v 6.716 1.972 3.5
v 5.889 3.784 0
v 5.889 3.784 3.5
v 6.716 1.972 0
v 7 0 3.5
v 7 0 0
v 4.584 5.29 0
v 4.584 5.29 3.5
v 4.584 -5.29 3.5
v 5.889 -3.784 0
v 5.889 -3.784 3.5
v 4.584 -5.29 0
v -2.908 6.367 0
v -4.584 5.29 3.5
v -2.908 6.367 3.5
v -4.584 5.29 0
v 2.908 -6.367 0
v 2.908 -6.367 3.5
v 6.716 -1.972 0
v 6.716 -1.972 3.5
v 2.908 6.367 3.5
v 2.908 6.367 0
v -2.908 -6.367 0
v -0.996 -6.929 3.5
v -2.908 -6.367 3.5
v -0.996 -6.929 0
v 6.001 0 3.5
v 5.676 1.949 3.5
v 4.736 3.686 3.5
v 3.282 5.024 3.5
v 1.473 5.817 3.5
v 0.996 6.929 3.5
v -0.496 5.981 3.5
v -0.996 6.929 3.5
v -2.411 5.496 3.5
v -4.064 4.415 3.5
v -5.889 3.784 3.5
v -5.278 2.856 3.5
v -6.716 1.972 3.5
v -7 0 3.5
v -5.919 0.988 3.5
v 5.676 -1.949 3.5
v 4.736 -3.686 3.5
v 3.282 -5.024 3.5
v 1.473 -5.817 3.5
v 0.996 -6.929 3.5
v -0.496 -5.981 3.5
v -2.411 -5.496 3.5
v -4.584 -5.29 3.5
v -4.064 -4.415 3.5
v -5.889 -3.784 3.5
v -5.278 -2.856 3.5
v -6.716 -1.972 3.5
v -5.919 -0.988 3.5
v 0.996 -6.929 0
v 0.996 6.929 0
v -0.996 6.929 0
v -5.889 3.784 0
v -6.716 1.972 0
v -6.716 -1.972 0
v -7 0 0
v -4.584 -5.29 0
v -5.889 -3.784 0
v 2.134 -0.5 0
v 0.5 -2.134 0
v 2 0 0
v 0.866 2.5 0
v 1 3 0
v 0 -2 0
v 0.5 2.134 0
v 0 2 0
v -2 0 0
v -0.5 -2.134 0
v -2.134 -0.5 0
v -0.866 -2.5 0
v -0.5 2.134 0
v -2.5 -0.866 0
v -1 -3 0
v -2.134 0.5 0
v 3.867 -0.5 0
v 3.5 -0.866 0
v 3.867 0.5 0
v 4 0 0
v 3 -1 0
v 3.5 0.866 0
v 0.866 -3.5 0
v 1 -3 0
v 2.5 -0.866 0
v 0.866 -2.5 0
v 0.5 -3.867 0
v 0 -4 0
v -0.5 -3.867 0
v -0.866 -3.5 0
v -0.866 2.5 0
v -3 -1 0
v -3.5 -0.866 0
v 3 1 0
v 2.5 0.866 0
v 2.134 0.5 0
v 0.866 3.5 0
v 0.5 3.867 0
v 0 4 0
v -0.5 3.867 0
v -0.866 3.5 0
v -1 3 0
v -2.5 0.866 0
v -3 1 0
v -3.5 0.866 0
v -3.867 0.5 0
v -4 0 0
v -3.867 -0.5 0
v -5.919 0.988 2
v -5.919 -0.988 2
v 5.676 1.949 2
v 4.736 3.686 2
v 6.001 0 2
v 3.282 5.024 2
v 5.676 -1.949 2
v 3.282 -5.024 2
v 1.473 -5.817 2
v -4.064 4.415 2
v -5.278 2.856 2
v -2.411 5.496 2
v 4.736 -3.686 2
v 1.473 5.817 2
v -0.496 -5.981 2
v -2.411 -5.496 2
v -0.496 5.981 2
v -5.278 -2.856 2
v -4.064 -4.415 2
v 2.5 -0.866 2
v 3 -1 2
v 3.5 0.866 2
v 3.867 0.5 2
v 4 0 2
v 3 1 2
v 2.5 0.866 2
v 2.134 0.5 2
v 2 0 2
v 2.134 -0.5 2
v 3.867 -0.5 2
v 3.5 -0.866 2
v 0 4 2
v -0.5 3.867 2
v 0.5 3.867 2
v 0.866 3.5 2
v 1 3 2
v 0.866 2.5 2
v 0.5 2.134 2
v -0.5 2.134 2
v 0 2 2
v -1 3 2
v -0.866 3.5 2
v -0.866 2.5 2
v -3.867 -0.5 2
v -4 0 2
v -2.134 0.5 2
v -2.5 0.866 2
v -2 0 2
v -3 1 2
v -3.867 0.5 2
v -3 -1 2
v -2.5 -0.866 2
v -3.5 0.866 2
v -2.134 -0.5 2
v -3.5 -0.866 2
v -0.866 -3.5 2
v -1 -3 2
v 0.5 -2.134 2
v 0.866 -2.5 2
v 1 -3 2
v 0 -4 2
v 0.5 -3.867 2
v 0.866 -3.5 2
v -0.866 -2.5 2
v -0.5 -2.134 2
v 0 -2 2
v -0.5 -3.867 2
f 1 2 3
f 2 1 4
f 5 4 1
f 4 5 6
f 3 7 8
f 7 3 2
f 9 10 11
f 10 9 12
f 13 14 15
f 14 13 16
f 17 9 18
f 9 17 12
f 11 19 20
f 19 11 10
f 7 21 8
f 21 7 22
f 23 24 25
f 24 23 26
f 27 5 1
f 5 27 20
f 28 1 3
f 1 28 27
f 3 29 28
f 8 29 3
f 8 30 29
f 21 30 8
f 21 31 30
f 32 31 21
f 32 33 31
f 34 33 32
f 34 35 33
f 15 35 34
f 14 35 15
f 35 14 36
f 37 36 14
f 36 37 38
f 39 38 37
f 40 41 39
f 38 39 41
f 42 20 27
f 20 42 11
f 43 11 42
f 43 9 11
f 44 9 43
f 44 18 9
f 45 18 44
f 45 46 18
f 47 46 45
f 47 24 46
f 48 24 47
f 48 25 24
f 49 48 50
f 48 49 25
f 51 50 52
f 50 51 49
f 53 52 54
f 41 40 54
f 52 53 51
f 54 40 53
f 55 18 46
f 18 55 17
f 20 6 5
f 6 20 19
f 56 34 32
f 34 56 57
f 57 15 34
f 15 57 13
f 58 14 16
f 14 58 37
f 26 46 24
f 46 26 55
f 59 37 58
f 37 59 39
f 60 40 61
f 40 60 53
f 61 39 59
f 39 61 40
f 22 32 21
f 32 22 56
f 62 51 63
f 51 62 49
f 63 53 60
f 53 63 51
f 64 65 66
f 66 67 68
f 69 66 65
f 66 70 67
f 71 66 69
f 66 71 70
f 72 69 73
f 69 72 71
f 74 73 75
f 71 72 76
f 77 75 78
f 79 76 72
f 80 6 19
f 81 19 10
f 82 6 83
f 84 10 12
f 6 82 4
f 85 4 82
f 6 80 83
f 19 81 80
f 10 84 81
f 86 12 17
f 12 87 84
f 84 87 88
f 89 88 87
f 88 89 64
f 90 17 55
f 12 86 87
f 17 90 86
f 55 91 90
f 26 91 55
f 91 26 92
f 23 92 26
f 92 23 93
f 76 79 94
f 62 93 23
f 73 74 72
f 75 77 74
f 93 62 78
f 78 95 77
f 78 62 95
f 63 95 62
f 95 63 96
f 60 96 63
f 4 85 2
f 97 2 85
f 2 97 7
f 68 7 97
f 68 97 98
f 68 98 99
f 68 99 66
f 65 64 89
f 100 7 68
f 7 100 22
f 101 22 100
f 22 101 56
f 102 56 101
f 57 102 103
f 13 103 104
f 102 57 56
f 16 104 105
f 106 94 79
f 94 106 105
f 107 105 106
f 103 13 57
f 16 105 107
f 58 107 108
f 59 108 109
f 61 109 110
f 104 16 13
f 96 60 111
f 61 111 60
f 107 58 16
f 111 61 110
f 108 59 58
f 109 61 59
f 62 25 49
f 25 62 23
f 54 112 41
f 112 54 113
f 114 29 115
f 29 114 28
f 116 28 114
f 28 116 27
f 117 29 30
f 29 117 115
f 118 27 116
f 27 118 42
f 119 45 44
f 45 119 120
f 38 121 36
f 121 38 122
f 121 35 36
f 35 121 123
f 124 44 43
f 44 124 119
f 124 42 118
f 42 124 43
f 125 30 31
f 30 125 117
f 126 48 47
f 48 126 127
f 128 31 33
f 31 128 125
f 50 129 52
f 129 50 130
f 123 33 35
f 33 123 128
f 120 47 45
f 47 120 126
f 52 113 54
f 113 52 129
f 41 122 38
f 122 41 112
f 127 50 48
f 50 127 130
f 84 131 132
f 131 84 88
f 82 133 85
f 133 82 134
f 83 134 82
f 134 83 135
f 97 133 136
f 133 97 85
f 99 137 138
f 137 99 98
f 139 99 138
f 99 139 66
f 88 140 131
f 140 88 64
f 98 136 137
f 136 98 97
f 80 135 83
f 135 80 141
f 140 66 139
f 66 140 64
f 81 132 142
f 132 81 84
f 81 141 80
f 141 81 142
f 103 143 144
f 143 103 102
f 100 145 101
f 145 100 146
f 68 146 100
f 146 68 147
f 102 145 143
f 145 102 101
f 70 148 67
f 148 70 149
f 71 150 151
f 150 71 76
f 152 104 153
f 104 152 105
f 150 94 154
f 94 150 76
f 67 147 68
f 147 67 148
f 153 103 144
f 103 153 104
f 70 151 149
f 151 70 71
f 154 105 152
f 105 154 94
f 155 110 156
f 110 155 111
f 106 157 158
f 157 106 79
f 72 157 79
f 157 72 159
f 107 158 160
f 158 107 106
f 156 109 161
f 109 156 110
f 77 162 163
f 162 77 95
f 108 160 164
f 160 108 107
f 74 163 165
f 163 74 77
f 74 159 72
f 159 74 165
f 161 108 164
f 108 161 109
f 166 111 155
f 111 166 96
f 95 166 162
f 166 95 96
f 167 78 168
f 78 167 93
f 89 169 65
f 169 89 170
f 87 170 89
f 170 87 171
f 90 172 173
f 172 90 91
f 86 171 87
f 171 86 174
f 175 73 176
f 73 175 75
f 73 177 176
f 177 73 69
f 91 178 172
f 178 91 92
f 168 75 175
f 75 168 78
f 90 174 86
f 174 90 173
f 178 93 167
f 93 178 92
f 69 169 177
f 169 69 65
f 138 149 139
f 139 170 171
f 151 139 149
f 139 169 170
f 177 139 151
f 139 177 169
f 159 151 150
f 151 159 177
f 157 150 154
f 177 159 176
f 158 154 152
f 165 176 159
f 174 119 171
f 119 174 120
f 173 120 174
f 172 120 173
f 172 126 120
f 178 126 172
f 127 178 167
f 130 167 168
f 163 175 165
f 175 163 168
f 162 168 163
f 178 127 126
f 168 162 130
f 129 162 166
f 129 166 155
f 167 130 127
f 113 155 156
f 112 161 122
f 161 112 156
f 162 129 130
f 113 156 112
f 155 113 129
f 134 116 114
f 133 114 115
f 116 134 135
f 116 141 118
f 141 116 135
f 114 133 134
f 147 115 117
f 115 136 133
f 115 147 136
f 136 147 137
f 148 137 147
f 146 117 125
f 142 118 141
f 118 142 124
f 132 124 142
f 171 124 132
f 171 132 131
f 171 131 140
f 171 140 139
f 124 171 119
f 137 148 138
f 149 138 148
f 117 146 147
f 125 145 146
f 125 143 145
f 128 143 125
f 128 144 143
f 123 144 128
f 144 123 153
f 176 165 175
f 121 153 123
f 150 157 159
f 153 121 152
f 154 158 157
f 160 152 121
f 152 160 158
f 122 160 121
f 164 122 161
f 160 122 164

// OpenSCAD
/* [Button] */
// How thick should the button be in the center? (mm)
buttonThickness = 2; // [2:2.0 millimetres,2.5:2.5 millimetres,3:3.0 millimetres,5:5.0 millimetres,10:10 millimetres]

// What is the distance from one side of the button to the other? (mm)
buttonDiameter = 14; // [7:40]

// How wide should the trim around the button be? (mm)
buttonTrimThickness = 2; // [0:39]

// How far off of the top of the button should the trim stand? (mm)
buttonTrimHeight = 1.5; // [1.5:1.5 millimetres,2:2.0 millimetres,2.5:2.5 millimetres,3:3.0 millimetres]

/* [Threadholes] */
// How many threadholes should the button have?
holeCount = 4; // [0:8]

// How far from the centre should the threadholes be (fraction out of 10)?
holeDistanceToCentre = 5; // [0:10]

// How big should each threadhole be? (mm)
holeSize = 2; // [1:6]

// END OF CUSTOMIZER VARIABLES

innerDiameter = buttonDiameter - (buttonTrimThickness-0.001 * 2);	// Used to line things up so they won't collide with the trim

// Lays out the  cylinders that will be used to form the threadholes
module holes() {	
	if ( (holeCount > 0) && (holeCount != 1) ) {	// Avoid a divide-by-zero error
		rotationDegrees = 360 / holeCount;	// This places the holes equally around the centre
		
		for(currentRotation = [0 : rotationDegrees : 359]) {	// Stop at 359 degrees, because 360 degrees is coterminal to 0 degrees
			singleHole( ((holeDistanceToCentre * .05) * innerDiameter * cos(currentRotation)),
				((holeDistanceToCentre * .05) * innerDiameter * sin(currentRotation)) );
			
			/*	Multiplying by .05 makes the distance to centre a fraction of 1, and then divides it by two (diameter to radius)
				The x coordinate is found by multiplying the sine of the current angle by the distance from the centre
				The y coordinate is found the same way, except using the cosine instead of the sine. */
		}
	} else if ( (holeCount > 0) && (holeCount == 1) ) {
		singleHole(0, 0);	// If there's only one hole, just put it in the middle
	}
}

// Defines a single threadhole cylinder; used in holes()
module singleHole(x, y) {
	translate([x,y,0]) cylinder(h=(buttonThickness + buttonTrimHeight) * 3, d=holeSize, center=true, $fn=12);
}

// The button, minus the trim
module buttonInnerDisc() {
	difference() {
		cylinder(h=buttonThickness, d=innerDiameter);
		holes();
	}
}

// Just the trim for the button
module buttonTrim() {
	difference() {
		cylinder(h=buttonThickness + buttonTrimHeight, d=buttonDiameter);
		cylinder(h=buttonThickness * 4, d=innerDiameter, center=true);
	}
}

// Compile everything together and make the final button
module makeButton() {
	buttonTrim();
	buttonInnerDisc();
}

makeButton();
